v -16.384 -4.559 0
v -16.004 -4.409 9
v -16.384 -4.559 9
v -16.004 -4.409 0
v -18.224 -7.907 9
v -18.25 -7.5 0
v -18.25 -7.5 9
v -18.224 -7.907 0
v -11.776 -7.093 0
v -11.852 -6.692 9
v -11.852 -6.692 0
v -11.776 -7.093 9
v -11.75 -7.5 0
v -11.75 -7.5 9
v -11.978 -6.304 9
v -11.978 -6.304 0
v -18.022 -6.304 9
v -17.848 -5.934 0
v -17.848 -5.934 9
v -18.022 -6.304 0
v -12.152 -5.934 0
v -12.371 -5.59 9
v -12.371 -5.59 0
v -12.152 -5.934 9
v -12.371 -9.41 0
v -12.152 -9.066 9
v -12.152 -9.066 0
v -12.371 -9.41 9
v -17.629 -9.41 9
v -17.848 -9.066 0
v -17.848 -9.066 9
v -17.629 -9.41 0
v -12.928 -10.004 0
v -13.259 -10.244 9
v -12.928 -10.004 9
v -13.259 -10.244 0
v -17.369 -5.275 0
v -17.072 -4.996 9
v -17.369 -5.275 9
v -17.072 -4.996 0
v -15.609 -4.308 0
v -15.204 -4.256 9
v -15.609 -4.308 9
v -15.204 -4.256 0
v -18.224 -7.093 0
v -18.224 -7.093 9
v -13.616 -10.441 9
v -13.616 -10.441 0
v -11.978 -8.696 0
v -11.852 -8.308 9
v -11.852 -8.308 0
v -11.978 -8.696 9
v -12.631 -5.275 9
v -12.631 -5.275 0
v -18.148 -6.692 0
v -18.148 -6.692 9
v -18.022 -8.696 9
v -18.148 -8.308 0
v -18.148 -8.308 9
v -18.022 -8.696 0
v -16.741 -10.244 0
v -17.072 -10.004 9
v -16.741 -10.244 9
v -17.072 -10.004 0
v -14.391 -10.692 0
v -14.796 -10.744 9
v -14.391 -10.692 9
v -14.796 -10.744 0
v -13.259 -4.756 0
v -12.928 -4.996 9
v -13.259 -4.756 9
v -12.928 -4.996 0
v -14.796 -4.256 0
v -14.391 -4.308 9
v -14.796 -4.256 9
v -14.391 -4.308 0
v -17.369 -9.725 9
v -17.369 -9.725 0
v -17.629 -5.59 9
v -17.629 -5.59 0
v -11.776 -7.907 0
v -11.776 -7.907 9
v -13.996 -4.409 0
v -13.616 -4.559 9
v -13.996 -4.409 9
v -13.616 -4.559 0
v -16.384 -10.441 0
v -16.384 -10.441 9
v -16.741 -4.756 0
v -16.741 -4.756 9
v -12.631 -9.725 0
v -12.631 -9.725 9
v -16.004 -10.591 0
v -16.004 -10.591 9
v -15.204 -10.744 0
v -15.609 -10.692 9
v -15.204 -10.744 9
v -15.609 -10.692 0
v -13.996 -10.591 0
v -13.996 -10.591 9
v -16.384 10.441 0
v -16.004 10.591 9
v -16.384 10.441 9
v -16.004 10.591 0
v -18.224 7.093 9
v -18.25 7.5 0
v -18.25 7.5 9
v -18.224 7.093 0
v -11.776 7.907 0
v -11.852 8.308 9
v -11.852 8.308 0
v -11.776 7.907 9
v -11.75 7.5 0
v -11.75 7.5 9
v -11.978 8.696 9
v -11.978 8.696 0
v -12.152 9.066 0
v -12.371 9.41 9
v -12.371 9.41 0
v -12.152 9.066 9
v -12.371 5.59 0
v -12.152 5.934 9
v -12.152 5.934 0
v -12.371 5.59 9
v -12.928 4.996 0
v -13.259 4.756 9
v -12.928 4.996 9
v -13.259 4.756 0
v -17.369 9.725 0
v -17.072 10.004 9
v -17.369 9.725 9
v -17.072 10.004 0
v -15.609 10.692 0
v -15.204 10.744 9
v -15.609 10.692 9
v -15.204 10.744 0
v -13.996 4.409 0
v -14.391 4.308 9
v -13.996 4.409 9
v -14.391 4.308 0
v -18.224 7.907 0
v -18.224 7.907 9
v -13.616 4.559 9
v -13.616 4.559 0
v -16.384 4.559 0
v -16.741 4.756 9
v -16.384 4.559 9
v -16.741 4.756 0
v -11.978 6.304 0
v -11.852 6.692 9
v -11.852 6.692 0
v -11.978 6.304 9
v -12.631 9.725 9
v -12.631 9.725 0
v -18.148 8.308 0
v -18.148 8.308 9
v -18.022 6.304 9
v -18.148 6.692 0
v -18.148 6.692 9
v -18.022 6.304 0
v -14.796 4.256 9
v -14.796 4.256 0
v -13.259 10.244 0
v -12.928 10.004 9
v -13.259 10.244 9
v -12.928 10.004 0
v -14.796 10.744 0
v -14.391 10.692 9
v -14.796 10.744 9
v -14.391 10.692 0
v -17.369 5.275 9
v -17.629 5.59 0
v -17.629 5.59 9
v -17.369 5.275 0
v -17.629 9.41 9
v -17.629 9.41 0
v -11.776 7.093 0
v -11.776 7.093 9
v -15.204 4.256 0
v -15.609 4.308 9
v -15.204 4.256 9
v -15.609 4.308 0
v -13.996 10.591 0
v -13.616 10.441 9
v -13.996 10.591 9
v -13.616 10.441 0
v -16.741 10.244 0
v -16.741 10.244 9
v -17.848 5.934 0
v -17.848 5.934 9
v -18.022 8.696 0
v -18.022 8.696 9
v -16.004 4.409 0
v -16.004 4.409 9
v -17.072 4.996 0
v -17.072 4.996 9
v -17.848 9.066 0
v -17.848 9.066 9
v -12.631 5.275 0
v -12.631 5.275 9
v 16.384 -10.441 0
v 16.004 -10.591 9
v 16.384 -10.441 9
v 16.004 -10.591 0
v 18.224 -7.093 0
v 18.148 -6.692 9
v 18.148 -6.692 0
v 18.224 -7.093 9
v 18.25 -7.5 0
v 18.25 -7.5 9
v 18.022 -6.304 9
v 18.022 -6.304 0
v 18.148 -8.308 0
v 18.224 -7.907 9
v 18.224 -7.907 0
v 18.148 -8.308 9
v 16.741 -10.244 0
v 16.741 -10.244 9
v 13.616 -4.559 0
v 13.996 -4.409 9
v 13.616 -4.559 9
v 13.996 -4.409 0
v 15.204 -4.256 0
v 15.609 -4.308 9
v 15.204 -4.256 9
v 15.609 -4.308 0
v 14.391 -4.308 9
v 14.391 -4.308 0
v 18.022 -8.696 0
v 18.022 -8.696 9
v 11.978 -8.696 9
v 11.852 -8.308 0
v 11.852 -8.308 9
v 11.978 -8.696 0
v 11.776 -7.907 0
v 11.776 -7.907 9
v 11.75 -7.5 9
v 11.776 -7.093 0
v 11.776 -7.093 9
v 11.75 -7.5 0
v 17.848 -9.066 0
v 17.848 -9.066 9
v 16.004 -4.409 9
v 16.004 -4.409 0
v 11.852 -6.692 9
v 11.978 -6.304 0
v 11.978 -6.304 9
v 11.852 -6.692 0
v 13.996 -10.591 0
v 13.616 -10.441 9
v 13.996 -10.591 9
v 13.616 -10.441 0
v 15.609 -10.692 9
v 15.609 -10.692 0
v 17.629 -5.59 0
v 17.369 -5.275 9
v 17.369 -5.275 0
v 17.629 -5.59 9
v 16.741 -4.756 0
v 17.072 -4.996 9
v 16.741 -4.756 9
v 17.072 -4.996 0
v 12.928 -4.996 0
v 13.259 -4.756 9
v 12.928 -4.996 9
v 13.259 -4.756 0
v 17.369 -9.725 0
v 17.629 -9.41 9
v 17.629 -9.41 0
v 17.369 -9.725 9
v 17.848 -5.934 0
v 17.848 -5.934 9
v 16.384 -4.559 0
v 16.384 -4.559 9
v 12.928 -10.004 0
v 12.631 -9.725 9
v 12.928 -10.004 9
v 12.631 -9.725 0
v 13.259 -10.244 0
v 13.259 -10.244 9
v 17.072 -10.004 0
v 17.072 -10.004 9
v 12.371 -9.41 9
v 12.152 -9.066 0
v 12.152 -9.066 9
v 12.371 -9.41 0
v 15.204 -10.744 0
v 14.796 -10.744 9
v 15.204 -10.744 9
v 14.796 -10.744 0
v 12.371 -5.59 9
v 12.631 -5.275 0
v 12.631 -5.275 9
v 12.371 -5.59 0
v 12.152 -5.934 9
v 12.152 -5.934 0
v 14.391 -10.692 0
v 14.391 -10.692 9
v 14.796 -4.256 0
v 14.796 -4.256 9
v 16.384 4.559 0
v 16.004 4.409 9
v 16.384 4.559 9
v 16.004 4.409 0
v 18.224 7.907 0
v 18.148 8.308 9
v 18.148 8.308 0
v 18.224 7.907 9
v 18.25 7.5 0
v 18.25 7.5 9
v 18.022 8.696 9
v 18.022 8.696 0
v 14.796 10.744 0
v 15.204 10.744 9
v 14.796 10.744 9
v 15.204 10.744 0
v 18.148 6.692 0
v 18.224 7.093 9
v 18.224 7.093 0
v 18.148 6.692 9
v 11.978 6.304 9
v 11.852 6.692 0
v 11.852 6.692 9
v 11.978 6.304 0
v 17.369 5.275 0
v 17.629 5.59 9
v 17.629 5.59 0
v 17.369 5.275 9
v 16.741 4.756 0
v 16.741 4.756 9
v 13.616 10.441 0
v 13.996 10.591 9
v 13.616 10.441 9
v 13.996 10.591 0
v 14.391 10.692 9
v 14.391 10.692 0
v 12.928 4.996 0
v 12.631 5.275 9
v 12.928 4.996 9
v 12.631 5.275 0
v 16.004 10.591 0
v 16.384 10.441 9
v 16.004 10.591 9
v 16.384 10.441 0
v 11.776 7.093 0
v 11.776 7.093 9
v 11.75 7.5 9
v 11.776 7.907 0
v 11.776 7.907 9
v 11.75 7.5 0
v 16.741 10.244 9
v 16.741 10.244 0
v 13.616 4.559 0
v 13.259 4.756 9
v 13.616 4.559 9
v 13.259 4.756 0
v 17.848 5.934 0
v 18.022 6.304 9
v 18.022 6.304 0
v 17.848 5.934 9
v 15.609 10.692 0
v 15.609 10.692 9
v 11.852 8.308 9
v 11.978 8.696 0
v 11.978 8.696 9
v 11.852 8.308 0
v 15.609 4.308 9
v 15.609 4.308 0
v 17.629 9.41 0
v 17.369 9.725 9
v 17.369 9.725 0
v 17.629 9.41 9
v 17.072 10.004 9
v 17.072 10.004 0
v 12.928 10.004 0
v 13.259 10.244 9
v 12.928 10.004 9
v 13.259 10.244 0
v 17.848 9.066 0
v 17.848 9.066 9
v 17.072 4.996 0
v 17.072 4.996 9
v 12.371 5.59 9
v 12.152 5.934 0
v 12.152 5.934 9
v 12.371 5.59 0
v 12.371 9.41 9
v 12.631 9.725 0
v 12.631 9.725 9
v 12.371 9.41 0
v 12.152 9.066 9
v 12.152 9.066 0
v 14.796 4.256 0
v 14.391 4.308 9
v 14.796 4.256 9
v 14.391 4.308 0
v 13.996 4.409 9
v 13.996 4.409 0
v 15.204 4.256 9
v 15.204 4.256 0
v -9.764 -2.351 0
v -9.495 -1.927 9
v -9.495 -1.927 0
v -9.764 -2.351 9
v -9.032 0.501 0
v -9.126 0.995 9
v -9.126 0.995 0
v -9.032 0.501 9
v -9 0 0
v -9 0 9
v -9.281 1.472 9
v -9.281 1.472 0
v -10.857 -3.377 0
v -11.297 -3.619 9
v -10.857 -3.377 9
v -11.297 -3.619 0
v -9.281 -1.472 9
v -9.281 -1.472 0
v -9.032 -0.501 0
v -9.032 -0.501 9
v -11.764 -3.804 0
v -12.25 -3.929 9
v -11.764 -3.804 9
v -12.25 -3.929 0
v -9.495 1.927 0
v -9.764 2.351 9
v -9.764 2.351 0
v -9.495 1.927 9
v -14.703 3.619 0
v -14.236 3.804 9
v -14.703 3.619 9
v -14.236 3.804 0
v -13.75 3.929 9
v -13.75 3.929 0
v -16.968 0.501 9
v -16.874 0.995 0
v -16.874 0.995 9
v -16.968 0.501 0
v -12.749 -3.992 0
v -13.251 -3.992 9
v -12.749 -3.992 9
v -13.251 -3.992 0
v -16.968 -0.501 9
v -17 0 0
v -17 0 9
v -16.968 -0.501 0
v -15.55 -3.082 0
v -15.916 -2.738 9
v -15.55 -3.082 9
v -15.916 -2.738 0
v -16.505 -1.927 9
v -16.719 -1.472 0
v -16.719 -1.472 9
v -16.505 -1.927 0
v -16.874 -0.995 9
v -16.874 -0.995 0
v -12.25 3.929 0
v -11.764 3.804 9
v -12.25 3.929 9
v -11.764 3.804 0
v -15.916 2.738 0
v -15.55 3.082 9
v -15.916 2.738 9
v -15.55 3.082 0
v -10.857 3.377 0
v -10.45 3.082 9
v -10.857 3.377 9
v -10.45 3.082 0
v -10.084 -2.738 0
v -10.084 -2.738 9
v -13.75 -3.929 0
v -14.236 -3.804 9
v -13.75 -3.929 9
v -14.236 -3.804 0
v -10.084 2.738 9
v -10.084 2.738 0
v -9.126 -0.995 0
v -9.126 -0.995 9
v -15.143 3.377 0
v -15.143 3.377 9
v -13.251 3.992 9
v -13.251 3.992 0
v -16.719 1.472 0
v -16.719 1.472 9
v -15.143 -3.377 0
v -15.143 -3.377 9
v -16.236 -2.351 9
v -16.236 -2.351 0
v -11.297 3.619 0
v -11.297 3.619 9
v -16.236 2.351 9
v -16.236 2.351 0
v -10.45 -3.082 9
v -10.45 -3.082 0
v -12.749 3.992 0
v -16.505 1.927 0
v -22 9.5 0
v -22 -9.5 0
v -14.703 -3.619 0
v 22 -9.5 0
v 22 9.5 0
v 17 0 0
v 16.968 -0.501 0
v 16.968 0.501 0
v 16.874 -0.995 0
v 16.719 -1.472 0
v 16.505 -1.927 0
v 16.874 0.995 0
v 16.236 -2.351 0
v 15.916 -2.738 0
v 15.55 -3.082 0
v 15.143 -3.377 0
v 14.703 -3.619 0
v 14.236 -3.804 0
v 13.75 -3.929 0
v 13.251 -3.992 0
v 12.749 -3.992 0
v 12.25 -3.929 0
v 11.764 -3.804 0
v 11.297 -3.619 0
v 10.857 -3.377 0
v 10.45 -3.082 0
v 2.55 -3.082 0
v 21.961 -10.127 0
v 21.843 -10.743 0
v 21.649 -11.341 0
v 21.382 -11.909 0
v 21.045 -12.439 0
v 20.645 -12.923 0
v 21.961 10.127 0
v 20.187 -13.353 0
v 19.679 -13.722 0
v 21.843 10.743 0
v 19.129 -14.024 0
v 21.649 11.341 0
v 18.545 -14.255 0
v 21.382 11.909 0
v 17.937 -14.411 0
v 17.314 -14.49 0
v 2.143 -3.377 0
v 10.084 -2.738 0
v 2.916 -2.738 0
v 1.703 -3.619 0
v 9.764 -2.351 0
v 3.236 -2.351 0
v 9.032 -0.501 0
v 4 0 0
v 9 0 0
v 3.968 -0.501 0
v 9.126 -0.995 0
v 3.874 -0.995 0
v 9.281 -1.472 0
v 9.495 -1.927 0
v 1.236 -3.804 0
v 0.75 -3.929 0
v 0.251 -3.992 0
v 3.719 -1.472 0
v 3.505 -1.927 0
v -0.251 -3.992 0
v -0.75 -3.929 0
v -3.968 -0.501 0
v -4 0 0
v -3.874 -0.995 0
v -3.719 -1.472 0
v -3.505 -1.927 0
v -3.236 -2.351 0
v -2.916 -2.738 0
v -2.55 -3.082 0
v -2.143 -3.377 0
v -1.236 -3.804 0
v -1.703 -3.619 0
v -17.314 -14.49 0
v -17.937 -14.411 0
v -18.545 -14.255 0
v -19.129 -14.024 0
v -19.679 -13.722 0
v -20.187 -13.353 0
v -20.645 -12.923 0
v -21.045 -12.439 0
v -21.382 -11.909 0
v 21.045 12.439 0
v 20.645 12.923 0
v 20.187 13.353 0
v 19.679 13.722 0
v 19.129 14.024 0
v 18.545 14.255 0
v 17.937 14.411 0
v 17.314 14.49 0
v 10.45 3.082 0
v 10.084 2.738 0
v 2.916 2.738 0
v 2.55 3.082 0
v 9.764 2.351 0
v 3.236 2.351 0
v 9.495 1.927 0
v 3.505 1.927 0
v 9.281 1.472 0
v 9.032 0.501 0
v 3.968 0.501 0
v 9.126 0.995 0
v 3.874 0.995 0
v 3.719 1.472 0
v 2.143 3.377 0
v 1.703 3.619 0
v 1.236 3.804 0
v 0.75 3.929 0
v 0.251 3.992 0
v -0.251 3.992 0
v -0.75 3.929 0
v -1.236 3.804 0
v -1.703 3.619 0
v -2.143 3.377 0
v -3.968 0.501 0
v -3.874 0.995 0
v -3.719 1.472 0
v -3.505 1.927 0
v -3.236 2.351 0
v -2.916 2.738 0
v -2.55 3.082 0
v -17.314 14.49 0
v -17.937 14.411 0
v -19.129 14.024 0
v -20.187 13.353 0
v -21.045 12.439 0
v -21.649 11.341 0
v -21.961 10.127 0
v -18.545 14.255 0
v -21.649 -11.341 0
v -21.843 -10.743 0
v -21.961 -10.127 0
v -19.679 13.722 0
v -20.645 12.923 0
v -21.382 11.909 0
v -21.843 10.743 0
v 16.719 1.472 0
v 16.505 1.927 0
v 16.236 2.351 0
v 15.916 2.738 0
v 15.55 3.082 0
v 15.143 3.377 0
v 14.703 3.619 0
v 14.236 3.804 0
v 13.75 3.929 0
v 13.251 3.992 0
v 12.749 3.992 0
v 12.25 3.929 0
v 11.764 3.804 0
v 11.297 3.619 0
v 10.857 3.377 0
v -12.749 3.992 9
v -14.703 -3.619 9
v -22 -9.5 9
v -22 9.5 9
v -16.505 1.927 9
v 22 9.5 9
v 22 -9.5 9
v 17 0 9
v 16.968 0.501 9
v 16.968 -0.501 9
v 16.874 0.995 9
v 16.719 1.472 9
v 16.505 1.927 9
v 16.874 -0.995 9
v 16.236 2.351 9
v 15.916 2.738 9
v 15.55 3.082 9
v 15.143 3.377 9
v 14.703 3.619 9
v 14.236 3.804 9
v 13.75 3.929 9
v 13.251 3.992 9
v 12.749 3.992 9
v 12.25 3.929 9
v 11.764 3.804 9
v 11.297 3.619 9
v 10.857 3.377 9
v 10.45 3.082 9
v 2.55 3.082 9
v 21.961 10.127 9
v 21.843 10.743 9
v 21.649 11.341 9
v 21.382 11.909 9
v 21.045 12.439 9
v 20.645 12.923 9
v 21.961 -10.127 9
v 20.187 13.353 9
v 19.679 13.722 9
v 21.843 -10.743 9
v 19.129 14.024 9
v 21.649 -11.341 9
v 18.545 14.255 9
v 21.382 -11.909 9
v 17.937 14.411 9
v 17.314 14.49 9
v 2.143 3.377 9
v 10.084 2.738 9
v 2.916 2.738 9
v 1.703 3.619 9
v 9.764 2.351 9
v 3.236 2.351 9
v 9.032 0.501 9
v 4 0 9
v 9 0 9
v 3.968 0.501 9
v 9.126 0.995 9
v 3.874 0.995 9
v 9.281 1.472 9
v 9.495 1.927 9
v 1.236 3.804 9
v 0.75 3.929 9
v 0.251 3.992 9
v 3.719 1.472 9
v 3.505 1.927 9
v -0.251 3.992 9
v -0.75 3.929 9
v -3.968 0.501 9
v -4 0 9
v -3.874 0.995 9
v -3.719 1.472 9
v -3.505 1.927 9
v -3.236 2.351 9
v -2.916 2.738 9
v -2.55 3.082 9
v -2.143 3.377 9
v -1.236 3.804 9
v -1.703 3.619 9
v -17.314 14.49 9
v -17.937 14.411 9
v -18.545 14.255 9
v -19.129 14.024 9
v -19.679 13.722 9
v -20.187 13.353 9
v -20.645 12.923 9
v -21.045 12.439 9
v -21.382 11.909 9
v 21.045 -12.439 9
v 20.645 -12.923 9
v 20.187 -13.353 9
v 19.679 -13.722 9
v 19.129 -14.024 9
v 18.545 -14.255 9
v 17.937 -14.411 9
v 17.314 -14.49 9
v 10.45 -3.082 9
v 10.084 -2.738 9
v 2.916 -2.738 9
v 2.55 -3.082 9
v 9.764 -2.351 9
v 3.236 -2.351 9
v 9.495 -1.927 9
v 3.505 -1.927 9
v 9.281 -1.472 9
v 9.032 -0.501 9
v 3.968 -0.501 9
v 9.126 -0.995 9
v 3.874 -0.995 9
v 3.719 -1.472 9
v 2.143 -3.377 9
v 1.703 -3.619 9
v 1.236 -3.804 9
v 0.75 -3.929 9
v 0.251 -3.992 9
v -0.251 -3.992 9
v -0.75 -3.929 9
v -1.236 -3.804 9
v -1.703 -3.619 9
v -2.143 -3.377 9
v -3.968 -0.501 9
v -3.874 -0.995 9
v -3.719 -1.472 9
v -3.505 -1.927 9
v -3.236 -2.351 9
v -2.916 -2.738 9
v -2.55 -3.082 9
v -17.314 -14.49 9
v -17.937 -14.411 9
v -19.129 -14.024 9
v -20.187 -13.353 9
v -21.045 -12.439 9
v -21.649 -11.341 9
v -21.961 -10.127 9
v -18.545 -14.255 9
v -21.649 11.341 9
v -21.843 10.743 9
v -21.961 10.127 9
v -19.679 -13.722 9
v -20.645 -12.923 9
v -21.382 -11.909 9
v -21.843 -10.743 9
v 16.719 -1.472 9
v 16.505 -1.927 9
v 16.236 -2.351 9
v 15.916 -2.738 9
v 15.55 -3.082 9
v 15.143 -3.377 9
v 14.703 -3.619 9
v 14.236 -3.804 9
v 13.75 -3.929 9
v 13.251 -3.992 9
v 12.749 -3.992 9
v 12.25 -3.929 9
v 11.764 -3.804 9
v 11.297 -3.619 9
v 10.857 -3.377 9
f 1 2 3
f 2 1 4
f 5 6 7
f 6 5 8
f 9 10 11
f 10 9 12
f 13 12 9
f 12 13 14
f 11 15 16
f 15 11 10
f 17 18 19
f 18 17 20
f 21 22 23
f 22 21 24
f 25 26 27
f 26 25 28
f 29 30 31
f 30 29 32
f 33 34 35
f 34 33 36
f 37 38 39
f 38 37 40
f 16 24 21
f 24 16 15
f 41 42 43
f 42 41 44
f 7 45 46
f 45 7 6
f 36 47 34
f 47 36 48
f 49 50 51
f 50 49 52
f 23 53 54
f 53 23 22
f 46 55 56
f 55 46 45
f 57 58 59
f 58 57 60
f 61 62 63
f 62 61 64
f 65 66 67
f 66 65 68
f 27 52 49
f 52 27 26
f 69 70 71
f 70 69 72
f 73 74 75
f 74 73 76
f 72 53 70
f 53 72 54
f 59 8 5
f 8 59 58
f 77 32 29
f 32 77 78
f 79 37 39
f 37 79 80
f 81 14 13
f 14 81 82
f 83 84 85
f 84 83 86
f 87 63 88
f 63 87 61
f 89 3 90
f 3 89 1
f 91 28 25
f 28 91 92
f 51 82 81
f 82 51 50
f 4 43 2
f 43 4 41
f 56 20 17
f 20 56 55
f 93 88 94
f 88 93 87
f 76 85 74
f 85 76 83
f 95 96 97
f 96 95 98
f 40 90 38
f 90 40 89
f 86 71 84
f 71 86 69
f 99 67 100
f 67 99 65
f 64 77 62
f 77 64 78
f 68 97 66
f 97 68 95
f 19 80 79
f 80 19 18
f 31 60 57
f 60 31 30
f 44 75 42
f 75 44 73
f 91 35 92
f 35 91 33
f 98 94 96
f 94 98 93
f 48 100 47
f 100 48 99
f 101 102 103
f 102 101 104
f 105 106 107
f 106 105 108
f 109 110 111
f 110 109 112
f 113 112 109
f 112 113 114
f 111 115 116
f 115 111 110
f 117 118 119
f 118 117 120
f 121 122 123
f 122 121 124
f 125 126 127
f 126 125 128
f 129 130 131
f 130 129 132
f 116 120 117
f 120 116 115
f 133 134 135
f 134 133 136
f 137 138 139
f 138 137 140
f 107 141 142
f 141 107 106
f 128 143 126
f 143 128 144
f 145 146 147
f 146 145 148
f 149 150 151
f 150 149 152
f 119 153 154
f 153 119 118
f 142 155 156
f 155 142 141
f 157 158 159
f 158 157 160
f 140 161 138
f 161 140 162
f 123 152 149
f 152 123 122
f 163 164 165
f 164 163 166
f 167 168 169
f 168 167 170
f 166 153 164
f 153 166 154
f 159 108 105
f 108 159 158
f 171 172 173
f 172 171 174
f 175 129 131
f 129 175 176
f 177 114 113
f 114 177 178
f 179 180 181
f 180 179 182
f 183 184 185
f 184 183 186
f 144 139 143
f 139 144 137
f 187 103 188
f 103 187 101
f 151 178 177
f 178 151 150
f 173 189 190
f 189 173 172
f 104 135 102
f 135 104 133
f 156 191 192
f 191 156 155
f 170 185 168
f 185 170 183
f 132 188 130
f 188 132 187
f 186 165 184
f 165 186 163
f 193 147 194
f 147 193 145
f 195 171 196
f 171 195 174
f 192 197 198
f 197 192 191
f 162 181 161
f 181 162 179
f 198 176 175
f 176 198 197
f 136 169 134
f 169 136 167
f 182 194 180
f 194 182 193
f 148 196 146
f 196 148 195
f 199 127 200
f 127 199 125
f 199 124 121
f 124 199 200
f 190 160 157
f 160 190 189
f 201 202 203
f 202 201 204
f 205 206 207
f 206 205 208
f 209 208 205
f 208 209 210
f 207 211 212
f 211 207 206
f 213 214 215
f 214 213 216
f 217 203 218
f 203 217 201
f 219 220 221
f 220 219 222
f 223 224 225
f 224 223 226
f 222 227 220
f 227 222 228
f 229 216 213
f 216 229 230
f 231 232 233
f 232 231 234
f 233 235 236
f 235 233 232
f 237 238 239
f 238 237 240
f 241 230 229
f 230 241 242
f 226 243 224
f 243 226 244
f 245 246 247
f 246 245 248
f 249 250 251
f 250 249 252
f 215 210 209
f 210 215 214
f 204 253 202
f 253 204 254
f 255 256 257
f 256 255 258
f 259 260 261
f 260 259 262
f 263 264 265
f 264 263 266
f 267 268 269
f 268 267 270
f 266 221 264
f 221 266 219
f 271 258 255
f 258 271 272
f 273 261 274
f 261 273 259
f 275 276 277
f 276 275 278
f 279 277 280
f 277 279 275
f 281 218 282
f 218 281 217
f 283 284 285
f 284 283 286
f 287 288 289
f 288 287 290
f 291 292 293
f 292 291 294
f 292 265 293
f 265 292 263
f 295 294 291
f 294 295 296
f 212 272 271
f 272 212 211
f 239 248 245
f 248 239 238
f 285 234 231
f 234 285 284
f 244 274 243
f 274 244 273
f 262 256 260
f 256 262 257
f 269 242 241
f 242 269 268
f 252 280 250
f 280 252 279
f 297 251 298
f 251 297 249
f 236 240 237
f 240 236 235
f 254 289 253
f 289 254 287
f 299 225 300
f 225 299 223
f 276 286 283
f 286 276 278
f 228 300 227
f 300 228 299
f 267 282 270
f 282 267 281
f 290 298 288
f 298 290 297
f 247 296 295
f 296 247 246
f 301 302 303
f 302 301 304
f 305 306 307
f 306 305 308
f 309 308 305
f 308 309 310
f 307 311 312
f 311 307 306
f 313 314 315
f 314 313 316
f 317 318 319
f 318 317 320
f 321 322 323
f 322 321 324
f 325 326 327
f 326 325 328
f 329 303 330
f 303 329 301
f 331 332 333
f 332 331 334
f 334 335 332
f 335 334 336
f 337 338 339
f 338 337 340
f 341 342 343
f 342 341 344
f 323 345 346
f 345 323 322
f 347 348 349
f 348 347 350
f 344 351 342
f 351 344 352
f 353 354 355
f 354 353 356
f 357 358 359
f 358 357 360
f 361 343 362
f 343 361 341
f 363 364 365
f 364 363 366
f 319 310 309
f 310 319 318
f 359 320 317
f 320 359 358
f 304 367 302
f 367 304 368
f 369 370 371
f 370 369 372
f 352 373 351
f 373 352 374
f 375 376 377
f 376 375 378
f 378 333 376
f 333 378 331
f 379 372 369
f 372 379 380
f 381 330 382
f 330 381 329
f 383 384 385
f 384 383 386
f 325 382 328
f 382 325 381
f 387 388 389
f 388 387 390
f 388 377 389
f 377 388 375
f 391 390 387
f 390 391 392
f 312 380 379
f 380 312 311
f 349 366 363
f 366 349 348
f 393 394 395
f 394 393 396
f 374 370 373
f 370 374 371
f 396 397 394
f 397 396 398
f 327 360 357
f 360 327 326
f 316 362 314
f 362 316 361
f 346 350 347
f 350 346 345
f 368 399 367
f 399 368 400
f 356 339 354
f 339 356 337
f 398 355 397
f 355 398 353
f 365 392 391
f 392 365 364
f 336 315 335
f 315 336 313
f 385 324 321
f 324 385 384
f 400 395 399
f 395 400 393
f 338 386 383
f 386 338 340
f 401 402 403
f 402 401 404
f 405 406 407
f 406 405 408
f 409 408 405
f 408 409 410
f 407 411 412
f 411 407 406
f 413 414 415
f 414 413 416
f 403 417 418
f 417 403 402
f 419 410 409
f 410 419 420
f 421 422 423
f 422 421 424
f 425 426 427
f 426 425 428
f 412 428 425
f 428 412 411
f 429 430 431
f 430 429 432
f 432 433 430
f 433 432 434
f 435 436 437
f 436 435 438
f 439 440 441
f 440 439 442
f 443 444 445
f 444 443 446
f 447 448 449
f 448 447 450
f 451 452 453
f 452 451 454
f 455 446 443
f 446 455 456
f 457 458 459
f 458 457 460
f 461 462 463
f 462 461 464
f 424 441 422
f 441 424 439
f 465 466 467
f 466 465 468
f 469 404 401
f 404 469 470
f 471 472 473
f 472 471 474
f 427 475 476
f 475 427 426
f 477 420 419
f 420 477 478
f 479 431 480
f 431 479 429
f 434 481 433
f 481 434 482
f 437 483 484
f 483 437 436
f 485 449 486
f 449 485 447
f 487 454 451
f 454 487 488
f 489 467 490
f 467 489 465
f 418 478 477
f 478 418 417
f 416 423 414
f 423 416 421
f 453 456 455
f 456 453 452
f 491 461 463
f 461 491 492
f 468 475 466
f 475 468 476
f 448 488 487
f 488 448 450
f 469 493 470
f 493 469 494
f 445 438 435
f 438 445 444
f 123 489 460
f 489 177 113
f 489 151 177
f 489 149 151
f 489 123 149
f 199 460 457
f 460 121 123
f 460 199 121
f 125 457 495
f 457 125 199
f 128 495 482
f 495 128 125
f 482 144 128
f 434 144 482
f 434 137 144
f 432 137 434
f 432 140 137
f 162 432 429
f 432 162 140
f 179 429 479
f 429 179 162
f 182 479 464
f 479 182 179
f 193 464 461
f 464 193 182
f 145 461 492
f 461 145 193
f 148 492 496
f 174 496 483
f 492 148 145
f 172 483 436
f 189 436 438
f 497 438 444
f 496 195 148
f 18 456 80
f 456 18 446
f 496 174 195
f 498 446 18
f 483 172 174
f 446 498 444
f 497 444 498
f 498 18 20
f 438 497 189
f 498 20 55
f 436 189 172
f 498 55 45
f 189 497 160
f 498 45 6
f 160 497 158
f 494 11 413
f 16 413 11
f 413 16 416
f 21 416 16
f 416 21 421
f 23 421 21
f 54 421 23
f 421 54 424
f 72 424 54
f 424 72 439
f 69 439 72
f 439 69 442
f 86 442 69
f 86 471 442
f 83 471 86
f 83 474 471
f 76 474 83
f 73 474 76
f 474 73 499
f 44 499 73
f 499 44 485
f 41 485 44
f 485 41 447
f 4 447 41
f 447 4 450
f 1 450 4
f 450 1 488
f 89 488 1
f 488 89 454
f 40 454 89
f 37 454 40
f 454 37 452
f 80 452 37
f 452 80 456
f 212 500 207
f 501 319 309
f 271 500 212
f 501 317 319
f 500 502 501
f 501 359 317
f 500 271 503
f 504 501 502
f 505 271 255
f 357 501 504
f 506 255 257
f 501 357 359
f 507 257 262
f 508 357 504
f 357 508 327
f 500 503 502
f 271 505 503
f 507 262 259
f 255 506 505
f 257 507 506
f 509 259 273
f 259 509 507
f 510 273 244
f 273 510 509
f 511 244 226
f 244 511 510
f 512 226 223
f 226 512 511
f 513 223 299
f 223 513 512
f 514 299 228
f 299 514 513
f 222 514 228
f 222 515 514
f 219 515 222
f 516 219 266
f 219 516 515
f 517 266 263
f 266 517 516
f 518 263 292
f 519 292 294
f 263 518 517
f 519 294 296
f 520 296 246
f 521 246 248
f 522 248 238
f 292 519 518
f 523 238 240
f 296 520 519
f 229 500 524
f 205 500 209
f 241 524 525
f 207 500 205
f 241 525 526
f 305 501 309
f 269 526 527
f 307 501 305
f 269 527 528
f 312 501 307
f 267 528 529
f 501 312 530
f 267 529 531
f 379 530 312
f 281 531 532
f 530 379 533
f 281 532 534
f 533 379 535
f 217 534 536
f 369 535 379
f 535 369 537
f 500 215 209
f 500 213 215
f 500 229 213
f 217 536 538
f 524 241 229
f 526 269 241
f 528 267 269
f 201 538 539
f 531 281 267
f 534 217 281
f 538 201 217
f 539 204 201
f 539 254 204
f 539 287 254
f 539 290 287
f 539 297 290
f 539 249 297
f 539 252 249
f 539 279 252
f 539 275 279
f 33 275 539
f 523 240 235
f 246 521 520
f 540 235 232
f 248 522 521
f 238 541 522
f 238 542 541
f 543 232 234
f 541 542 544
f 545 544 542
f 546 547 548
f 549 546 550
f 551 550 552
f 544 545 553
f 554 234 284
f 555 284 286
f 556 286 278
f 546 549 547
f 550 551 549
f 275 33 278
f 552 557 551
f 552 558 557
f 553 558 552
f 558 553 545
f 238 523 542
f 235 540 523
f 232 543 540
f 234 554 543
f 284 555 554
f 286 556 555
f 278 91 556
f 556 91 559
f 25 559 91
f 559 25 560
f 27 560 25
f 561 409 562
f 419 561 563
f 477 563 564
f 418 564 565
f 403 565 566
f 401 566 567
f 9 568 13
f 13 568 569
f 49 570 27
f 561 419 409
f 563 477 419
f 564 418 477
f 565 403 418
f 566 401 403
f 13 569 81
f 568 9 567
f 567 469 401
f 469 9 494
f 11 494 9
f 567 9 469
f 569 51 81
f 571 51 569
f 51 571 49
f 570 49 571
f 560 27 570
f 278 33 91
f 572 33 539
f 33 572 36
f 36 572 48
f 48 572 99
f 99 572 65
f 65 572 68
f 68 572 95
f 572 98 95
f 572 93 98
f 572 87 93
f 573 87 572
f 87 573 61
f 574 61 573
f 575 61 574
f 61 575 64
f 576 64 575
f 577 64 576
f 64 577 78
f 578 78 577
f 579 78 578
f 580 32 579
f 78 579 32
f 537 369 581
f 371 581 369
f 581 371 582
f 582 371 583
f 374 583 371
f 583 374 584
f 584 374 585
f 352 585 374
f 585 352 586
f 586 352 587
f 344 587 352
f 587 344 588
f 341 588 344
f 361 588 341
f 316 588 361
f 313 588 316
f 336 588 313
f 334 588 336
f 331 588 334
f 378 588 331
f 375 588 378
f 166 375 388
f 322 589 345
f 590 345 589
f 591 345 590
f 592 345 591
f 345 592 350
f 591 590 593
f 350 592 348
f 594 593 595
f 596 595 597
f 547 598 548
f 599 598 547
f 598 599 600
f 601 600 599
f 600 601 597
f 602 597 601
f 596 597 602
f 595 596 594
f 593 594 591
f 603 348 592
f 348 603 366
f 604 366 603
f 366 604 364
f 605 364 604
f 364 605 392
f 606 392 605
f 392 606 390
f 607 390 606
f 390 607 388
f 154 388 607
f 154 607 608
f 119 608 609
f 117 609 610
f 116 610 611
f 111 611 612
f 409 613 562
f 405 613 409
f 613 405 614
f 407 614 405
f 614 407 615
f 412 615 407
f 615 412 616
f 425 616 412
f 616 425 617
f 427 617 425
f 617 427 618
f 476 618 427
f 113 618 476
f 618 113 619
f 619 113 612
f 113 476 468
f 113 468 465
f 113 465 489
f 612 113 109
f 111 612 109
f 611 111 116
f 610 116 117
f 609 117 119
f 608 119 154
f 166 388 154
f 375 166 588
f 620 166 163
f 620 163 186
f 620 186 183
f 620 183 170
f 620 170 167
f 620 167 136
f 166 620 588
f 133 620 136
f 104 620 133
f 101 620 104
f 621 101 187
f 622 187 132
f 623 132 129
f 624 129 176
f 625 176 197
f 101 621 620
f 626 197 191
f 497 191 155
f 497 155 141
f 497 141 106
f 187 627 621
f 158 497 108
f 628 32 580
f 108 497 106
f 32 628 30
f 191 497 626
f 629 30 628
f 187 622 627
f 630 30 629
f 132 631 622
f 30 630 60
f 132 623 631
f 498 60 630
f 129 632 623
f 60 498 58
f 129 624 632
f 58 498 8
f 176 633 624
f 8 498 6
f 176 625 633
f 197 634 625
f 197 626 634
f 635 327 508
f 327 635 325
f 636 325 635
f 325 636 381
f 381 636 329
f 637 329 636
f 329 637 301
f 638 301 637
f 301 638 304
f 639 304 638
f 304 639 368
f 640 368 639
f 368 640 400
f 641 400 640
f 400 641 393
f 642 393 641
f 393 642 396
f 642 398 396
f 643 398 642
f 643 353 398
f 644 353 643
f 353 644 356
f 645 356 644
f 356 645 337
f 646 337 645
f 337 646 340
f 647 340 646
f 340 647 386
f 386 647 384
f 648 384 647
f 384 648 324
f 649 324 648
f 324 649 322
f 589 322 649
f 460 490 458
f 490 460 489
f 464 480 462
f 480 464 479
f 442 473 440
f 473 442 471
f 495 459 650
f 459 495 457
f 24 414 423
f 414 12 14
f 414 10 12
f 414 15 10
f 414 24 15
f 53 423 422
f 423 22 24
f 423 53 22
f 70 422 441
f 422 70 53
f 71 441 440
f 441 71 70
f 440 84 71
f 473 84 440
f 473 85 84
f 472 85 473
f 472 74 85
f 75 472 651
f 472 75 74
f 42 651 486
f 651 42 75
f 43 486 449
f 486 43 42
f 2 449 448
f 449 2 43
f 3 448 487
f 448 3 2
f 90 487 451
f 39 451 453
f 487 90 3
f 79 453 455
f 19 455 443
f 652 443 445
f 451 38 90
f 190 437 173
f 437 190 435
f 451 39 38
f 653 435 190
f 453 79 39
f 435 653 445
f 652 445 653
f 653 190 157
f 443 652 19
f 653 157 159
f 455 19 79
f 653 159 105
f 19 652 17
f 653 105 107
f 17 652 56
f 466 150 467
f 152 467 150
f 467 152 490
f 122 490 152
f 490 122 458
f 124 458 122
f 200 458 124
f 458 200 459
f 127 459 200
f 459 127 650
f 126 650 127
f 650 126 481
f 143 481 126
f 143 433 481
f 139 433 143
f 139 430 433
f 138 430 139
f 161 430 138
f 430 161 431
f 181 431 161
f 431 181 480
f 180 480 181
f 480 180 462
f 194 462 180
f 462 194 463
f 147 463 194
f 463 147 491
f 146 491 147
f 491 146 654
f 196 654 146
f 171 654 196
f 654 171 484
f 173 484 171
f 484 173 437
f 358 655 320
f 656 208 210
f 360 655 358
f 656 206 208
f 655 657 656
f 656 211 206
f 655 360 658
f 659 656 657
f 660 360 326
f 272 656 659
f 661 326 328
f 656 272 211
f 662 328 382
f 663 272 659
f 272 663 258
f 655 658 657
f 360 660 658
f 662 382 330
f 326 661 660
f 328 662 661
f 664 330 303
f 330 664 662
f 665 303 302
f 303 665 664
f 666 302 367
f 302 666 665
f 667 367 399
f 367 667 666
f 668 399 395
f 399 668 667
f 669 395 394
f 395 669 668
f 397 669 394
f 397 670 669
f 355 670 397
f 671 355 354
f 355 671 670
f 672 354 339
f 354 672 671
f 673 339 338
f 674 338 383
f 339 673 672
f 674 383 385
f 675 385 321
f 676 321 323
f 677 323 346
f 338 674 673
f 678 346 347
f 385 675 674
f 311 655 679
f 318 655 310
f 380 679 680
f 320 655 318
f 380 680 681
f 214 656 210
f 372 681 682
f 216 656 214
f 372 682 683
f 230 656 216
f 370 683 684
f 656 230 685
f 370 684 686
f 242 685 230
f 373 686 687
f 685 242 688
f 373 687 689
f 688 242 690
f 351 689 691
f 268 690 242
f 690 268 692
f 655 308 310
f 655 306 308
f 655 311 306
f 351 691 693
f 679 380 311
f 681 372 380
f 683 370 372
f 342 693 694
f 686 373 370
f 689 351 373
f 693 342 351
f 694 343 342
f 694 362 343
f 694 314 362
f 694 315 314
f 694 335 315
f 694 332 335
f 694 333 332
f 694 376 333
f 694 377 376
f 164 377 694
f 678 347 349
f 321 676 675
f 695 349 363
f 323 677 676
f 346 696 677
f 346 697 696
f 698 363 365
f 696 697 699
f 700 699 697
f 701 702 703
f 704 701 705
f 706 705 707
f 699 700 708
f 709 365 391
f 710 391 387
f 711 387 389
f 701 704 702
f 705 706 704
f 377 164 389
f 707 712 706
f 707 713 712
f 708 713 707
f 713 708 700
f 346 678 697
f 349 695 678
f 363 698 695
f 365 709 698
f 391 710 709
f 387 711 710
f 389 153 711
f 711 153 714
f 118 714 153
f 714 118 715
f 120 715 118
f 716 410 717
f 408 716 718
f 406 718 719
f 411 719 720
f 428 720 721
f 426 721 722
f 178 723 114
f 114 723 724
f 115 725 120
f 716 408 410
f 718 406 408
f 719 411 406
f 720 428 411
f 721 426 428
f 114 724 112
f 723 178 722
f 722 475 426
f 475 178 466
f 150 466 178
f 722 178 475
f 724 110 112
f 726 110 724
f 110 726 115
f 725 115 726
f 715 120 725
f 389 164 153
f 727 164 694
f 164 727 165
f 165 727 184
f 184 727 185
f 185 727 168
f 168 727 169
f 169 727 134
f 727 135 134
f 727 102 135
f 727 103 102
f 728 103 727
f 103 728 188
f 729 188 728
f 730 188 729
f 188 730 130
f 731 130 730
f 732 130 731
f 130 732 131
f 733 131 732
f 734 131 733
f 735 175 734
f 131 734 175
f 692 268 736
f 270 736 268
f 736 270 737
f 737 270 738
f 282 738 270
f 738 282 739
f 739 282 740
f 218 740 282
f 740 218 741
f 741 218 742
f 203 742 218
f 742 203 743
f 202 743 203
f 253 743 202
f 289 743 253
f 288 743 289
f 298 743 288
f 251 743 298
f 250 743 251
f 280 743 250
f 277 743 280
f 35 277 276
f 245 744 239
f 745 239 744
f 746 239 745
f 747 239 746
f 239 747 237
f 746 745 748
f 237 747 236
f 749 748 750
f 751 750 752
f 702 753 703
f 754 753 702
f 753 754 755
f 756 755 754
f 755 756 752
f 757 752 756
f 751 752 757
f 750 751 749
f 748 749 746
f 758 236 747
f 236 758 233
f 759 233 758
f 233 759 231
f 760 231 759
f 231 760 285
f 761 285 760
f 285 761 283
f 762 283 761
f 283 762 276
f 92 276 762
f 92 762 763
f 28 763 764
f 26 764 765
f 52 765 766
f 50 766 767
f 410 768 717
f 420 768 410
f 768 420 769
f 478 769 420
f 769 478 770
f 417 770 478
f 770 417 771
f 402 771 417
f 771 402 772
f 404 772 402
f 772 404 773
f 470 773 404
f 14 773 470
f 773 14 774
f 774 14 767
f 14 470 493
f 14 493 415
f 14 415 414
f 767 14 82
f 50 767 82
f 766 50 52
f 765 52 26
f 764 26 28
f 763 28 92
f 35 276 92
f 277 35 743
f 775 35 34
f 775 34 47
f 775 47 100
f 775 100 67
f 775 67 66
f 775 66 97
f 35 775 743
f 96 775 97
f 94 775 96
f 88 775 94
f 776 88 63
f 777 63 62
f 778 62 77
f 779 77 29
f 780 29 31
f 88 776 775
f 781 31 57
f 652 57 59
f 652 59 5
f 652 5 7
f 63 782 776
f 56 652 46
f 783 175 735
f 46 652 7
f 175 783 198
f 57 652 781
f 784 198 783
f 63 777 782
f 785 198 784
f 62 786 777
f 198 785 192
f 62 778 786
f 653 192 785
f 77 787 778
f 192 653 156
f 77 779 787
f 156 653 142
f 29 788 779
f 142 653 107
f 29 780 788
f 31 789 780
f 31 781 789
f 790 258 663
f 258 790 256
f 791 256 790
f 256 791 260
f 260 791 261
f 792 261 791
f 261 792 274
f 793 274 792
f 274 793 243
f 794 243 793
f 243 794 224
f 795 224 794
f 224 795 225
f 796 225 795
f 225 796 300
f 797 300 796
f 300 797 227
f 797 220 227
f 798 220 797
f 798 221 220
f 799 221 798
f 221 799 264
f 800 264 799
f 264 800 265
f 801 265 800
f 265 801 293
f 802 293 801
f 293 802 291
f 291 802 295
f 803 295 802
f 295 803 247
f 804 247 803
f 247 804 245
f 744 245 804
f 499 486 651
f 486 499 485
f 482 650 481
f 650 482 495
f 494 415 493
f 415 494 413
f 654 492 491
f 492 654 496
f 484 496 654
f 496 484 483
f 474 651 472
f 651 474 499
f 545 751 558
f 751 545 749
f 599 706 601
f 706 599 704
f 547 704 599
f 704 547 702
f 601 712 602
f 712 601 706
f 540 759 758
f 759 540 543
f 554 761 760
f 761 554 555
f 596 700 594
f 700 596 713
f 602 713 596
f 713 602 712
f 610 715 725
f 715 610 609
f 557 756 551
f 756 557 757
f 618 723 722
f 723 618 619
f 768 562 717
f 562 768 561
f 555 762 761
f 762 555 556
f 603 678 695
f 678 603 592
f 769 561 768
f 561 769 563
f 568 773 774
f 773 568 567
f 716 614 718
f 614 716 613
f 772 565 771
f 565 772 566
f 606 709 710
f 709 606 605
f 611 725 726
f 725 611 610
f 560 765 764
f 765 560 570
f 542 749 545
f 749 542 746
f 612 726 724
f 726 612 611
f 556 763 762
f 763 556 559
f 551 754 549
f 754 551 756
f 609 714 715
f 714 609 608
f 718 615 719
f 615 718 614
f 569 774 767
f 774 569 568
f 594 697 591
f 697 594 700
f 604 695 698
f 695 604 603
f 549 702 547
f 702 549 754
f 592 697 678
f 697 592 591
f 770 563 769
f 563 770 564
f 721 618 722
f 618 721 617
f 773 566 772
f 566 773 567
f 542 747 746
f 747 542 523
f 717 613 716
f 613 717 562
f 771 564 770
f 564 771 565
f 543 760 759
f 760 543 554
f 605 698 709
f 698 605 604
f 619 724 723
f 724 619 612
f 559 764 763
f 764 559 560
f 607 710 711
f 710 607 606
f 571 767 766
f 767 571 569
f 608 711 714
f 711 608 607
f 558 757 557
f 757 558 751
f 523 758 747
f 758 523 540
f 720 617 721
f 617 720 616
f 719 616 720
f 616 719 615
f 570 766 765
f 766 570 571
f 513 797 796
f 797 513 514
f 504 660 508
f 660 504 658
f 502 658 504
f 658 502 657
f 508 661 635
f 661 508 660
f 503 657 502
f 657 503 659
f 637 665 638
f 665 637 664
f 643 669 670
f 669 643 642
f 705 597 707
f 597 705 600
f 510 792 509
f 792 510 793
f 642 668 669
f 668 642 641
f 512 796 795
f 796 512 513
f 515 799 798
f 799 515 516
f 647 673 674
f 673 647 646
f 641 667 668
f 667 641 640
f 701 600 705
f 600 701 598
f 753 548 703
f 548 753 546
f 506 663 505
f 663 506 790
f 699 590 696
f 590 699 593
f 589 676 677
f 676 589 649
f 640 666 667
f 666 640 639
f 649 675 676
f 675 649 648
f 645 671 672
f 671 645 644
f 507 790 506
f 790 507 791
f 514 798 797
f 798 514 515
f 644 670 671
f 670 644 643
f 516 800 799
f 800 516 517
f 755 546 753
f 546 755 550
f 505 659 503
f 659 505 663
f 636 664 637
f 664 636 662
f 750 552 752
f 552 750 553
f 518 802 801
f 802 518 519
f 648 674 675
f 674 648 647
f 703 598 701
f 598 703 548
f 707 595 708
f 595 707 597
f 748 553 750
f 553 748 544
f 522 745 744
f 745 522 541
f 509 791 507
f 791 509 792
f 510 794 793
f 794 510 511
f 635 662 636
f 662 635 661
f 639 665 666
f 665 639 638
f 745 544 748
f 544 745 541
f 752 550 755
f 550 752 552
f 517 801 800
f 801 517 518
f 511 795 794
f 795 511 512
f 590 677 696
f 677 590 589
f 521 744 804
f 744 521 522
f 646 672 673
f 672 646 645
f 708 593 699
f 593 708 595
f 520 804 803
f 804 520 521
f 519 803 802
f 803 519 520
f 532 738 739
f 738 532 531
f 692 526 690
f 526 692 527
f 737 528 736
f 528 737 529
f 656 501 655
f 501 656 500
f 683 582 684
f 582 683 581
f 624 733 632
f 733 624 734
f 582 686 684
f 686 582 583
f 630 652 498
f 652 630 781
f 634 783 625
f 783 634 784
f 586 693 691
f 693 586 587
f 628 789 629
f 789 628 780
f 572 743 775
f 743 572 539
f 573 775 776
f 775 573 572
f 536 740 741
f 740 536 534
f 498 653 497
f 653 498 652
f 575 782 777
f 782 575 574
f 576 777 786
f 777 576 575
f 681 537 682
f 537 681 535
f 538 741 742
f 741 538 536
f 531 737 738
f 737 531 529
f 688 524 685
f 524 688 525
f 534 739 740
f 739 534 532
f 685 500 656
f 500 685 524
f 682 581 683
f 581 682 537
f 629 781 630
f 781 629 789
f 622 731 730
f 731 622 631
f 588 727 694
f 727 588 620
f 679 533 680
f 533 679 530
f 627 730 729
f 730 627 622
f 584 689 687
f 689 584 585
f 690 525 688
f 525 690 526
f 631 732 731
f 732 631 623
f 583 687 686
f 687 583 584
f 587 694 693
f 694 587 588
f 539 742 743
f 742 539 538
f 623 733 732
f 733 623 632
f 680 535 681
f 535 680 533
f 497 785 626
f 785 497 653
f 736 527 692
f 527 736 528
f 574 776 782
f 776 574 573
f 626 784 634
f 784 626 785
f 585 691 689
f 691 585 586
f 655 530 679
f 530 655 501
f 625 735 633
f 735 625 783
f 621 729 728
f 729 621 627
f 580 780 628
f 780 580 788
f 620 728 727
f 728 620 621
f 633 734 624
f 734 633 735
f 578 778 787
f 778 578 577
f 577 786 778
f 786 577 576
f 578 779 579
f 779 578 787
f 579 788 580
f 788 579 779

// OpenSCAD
$fn = 50;


difference() {
	union() {
		hull() {
			translate(v = [-17.0000000000, 9.5000000000, 0]) {
				cylinder(h = 9, r = 5);
			}
			translate(v = [17.0000000000, 9.5000000000, 0]) {
				cylinder(h = 9, r = 5);
			}
			translate(v = [-17.0000000000, -9.5000000000, 0]) {
				cylinder(h = 9, r = 5);
			}
			translate(v = [17.0000000000, -9.5000000000, 0]) {
				cylinder(h = 9, r = 5);
			}
		}
	}
	union() {
		#translate(v = [-15.0000000000, -7.5000000000, -100.0000000000]) {
			cylinder(h = 200, r = 3.2500000000);
		}
		#translate(v = [-15.0000000000, 7.5000000000, -100.0000000000]) {
			cylinder(h = 200, r = 3.2500000000);
		}
		#translate(v = [15.0000000000, -7.5000000000, -100.0000000000]) {
			cylinder(h = 200, r = 3.2500000000);
		}
		#translate(v = [15.0000000000, 7.5000000000, -100.0000000000]) {
			cylinder(h = 200, r = 3.2500000000);
		}
		#translate(v = [-13.0000000000, 0, 0]) {
			cylinder(h = 9, r = 4.0000000000);
		}
		#cylinder(h = 9, r = 4.0000000000);
		#translate(v = [13.0000000000, 0, 0]) {
			cylinder(h = 9, r = 4.0000000000);
		}
	}
}
